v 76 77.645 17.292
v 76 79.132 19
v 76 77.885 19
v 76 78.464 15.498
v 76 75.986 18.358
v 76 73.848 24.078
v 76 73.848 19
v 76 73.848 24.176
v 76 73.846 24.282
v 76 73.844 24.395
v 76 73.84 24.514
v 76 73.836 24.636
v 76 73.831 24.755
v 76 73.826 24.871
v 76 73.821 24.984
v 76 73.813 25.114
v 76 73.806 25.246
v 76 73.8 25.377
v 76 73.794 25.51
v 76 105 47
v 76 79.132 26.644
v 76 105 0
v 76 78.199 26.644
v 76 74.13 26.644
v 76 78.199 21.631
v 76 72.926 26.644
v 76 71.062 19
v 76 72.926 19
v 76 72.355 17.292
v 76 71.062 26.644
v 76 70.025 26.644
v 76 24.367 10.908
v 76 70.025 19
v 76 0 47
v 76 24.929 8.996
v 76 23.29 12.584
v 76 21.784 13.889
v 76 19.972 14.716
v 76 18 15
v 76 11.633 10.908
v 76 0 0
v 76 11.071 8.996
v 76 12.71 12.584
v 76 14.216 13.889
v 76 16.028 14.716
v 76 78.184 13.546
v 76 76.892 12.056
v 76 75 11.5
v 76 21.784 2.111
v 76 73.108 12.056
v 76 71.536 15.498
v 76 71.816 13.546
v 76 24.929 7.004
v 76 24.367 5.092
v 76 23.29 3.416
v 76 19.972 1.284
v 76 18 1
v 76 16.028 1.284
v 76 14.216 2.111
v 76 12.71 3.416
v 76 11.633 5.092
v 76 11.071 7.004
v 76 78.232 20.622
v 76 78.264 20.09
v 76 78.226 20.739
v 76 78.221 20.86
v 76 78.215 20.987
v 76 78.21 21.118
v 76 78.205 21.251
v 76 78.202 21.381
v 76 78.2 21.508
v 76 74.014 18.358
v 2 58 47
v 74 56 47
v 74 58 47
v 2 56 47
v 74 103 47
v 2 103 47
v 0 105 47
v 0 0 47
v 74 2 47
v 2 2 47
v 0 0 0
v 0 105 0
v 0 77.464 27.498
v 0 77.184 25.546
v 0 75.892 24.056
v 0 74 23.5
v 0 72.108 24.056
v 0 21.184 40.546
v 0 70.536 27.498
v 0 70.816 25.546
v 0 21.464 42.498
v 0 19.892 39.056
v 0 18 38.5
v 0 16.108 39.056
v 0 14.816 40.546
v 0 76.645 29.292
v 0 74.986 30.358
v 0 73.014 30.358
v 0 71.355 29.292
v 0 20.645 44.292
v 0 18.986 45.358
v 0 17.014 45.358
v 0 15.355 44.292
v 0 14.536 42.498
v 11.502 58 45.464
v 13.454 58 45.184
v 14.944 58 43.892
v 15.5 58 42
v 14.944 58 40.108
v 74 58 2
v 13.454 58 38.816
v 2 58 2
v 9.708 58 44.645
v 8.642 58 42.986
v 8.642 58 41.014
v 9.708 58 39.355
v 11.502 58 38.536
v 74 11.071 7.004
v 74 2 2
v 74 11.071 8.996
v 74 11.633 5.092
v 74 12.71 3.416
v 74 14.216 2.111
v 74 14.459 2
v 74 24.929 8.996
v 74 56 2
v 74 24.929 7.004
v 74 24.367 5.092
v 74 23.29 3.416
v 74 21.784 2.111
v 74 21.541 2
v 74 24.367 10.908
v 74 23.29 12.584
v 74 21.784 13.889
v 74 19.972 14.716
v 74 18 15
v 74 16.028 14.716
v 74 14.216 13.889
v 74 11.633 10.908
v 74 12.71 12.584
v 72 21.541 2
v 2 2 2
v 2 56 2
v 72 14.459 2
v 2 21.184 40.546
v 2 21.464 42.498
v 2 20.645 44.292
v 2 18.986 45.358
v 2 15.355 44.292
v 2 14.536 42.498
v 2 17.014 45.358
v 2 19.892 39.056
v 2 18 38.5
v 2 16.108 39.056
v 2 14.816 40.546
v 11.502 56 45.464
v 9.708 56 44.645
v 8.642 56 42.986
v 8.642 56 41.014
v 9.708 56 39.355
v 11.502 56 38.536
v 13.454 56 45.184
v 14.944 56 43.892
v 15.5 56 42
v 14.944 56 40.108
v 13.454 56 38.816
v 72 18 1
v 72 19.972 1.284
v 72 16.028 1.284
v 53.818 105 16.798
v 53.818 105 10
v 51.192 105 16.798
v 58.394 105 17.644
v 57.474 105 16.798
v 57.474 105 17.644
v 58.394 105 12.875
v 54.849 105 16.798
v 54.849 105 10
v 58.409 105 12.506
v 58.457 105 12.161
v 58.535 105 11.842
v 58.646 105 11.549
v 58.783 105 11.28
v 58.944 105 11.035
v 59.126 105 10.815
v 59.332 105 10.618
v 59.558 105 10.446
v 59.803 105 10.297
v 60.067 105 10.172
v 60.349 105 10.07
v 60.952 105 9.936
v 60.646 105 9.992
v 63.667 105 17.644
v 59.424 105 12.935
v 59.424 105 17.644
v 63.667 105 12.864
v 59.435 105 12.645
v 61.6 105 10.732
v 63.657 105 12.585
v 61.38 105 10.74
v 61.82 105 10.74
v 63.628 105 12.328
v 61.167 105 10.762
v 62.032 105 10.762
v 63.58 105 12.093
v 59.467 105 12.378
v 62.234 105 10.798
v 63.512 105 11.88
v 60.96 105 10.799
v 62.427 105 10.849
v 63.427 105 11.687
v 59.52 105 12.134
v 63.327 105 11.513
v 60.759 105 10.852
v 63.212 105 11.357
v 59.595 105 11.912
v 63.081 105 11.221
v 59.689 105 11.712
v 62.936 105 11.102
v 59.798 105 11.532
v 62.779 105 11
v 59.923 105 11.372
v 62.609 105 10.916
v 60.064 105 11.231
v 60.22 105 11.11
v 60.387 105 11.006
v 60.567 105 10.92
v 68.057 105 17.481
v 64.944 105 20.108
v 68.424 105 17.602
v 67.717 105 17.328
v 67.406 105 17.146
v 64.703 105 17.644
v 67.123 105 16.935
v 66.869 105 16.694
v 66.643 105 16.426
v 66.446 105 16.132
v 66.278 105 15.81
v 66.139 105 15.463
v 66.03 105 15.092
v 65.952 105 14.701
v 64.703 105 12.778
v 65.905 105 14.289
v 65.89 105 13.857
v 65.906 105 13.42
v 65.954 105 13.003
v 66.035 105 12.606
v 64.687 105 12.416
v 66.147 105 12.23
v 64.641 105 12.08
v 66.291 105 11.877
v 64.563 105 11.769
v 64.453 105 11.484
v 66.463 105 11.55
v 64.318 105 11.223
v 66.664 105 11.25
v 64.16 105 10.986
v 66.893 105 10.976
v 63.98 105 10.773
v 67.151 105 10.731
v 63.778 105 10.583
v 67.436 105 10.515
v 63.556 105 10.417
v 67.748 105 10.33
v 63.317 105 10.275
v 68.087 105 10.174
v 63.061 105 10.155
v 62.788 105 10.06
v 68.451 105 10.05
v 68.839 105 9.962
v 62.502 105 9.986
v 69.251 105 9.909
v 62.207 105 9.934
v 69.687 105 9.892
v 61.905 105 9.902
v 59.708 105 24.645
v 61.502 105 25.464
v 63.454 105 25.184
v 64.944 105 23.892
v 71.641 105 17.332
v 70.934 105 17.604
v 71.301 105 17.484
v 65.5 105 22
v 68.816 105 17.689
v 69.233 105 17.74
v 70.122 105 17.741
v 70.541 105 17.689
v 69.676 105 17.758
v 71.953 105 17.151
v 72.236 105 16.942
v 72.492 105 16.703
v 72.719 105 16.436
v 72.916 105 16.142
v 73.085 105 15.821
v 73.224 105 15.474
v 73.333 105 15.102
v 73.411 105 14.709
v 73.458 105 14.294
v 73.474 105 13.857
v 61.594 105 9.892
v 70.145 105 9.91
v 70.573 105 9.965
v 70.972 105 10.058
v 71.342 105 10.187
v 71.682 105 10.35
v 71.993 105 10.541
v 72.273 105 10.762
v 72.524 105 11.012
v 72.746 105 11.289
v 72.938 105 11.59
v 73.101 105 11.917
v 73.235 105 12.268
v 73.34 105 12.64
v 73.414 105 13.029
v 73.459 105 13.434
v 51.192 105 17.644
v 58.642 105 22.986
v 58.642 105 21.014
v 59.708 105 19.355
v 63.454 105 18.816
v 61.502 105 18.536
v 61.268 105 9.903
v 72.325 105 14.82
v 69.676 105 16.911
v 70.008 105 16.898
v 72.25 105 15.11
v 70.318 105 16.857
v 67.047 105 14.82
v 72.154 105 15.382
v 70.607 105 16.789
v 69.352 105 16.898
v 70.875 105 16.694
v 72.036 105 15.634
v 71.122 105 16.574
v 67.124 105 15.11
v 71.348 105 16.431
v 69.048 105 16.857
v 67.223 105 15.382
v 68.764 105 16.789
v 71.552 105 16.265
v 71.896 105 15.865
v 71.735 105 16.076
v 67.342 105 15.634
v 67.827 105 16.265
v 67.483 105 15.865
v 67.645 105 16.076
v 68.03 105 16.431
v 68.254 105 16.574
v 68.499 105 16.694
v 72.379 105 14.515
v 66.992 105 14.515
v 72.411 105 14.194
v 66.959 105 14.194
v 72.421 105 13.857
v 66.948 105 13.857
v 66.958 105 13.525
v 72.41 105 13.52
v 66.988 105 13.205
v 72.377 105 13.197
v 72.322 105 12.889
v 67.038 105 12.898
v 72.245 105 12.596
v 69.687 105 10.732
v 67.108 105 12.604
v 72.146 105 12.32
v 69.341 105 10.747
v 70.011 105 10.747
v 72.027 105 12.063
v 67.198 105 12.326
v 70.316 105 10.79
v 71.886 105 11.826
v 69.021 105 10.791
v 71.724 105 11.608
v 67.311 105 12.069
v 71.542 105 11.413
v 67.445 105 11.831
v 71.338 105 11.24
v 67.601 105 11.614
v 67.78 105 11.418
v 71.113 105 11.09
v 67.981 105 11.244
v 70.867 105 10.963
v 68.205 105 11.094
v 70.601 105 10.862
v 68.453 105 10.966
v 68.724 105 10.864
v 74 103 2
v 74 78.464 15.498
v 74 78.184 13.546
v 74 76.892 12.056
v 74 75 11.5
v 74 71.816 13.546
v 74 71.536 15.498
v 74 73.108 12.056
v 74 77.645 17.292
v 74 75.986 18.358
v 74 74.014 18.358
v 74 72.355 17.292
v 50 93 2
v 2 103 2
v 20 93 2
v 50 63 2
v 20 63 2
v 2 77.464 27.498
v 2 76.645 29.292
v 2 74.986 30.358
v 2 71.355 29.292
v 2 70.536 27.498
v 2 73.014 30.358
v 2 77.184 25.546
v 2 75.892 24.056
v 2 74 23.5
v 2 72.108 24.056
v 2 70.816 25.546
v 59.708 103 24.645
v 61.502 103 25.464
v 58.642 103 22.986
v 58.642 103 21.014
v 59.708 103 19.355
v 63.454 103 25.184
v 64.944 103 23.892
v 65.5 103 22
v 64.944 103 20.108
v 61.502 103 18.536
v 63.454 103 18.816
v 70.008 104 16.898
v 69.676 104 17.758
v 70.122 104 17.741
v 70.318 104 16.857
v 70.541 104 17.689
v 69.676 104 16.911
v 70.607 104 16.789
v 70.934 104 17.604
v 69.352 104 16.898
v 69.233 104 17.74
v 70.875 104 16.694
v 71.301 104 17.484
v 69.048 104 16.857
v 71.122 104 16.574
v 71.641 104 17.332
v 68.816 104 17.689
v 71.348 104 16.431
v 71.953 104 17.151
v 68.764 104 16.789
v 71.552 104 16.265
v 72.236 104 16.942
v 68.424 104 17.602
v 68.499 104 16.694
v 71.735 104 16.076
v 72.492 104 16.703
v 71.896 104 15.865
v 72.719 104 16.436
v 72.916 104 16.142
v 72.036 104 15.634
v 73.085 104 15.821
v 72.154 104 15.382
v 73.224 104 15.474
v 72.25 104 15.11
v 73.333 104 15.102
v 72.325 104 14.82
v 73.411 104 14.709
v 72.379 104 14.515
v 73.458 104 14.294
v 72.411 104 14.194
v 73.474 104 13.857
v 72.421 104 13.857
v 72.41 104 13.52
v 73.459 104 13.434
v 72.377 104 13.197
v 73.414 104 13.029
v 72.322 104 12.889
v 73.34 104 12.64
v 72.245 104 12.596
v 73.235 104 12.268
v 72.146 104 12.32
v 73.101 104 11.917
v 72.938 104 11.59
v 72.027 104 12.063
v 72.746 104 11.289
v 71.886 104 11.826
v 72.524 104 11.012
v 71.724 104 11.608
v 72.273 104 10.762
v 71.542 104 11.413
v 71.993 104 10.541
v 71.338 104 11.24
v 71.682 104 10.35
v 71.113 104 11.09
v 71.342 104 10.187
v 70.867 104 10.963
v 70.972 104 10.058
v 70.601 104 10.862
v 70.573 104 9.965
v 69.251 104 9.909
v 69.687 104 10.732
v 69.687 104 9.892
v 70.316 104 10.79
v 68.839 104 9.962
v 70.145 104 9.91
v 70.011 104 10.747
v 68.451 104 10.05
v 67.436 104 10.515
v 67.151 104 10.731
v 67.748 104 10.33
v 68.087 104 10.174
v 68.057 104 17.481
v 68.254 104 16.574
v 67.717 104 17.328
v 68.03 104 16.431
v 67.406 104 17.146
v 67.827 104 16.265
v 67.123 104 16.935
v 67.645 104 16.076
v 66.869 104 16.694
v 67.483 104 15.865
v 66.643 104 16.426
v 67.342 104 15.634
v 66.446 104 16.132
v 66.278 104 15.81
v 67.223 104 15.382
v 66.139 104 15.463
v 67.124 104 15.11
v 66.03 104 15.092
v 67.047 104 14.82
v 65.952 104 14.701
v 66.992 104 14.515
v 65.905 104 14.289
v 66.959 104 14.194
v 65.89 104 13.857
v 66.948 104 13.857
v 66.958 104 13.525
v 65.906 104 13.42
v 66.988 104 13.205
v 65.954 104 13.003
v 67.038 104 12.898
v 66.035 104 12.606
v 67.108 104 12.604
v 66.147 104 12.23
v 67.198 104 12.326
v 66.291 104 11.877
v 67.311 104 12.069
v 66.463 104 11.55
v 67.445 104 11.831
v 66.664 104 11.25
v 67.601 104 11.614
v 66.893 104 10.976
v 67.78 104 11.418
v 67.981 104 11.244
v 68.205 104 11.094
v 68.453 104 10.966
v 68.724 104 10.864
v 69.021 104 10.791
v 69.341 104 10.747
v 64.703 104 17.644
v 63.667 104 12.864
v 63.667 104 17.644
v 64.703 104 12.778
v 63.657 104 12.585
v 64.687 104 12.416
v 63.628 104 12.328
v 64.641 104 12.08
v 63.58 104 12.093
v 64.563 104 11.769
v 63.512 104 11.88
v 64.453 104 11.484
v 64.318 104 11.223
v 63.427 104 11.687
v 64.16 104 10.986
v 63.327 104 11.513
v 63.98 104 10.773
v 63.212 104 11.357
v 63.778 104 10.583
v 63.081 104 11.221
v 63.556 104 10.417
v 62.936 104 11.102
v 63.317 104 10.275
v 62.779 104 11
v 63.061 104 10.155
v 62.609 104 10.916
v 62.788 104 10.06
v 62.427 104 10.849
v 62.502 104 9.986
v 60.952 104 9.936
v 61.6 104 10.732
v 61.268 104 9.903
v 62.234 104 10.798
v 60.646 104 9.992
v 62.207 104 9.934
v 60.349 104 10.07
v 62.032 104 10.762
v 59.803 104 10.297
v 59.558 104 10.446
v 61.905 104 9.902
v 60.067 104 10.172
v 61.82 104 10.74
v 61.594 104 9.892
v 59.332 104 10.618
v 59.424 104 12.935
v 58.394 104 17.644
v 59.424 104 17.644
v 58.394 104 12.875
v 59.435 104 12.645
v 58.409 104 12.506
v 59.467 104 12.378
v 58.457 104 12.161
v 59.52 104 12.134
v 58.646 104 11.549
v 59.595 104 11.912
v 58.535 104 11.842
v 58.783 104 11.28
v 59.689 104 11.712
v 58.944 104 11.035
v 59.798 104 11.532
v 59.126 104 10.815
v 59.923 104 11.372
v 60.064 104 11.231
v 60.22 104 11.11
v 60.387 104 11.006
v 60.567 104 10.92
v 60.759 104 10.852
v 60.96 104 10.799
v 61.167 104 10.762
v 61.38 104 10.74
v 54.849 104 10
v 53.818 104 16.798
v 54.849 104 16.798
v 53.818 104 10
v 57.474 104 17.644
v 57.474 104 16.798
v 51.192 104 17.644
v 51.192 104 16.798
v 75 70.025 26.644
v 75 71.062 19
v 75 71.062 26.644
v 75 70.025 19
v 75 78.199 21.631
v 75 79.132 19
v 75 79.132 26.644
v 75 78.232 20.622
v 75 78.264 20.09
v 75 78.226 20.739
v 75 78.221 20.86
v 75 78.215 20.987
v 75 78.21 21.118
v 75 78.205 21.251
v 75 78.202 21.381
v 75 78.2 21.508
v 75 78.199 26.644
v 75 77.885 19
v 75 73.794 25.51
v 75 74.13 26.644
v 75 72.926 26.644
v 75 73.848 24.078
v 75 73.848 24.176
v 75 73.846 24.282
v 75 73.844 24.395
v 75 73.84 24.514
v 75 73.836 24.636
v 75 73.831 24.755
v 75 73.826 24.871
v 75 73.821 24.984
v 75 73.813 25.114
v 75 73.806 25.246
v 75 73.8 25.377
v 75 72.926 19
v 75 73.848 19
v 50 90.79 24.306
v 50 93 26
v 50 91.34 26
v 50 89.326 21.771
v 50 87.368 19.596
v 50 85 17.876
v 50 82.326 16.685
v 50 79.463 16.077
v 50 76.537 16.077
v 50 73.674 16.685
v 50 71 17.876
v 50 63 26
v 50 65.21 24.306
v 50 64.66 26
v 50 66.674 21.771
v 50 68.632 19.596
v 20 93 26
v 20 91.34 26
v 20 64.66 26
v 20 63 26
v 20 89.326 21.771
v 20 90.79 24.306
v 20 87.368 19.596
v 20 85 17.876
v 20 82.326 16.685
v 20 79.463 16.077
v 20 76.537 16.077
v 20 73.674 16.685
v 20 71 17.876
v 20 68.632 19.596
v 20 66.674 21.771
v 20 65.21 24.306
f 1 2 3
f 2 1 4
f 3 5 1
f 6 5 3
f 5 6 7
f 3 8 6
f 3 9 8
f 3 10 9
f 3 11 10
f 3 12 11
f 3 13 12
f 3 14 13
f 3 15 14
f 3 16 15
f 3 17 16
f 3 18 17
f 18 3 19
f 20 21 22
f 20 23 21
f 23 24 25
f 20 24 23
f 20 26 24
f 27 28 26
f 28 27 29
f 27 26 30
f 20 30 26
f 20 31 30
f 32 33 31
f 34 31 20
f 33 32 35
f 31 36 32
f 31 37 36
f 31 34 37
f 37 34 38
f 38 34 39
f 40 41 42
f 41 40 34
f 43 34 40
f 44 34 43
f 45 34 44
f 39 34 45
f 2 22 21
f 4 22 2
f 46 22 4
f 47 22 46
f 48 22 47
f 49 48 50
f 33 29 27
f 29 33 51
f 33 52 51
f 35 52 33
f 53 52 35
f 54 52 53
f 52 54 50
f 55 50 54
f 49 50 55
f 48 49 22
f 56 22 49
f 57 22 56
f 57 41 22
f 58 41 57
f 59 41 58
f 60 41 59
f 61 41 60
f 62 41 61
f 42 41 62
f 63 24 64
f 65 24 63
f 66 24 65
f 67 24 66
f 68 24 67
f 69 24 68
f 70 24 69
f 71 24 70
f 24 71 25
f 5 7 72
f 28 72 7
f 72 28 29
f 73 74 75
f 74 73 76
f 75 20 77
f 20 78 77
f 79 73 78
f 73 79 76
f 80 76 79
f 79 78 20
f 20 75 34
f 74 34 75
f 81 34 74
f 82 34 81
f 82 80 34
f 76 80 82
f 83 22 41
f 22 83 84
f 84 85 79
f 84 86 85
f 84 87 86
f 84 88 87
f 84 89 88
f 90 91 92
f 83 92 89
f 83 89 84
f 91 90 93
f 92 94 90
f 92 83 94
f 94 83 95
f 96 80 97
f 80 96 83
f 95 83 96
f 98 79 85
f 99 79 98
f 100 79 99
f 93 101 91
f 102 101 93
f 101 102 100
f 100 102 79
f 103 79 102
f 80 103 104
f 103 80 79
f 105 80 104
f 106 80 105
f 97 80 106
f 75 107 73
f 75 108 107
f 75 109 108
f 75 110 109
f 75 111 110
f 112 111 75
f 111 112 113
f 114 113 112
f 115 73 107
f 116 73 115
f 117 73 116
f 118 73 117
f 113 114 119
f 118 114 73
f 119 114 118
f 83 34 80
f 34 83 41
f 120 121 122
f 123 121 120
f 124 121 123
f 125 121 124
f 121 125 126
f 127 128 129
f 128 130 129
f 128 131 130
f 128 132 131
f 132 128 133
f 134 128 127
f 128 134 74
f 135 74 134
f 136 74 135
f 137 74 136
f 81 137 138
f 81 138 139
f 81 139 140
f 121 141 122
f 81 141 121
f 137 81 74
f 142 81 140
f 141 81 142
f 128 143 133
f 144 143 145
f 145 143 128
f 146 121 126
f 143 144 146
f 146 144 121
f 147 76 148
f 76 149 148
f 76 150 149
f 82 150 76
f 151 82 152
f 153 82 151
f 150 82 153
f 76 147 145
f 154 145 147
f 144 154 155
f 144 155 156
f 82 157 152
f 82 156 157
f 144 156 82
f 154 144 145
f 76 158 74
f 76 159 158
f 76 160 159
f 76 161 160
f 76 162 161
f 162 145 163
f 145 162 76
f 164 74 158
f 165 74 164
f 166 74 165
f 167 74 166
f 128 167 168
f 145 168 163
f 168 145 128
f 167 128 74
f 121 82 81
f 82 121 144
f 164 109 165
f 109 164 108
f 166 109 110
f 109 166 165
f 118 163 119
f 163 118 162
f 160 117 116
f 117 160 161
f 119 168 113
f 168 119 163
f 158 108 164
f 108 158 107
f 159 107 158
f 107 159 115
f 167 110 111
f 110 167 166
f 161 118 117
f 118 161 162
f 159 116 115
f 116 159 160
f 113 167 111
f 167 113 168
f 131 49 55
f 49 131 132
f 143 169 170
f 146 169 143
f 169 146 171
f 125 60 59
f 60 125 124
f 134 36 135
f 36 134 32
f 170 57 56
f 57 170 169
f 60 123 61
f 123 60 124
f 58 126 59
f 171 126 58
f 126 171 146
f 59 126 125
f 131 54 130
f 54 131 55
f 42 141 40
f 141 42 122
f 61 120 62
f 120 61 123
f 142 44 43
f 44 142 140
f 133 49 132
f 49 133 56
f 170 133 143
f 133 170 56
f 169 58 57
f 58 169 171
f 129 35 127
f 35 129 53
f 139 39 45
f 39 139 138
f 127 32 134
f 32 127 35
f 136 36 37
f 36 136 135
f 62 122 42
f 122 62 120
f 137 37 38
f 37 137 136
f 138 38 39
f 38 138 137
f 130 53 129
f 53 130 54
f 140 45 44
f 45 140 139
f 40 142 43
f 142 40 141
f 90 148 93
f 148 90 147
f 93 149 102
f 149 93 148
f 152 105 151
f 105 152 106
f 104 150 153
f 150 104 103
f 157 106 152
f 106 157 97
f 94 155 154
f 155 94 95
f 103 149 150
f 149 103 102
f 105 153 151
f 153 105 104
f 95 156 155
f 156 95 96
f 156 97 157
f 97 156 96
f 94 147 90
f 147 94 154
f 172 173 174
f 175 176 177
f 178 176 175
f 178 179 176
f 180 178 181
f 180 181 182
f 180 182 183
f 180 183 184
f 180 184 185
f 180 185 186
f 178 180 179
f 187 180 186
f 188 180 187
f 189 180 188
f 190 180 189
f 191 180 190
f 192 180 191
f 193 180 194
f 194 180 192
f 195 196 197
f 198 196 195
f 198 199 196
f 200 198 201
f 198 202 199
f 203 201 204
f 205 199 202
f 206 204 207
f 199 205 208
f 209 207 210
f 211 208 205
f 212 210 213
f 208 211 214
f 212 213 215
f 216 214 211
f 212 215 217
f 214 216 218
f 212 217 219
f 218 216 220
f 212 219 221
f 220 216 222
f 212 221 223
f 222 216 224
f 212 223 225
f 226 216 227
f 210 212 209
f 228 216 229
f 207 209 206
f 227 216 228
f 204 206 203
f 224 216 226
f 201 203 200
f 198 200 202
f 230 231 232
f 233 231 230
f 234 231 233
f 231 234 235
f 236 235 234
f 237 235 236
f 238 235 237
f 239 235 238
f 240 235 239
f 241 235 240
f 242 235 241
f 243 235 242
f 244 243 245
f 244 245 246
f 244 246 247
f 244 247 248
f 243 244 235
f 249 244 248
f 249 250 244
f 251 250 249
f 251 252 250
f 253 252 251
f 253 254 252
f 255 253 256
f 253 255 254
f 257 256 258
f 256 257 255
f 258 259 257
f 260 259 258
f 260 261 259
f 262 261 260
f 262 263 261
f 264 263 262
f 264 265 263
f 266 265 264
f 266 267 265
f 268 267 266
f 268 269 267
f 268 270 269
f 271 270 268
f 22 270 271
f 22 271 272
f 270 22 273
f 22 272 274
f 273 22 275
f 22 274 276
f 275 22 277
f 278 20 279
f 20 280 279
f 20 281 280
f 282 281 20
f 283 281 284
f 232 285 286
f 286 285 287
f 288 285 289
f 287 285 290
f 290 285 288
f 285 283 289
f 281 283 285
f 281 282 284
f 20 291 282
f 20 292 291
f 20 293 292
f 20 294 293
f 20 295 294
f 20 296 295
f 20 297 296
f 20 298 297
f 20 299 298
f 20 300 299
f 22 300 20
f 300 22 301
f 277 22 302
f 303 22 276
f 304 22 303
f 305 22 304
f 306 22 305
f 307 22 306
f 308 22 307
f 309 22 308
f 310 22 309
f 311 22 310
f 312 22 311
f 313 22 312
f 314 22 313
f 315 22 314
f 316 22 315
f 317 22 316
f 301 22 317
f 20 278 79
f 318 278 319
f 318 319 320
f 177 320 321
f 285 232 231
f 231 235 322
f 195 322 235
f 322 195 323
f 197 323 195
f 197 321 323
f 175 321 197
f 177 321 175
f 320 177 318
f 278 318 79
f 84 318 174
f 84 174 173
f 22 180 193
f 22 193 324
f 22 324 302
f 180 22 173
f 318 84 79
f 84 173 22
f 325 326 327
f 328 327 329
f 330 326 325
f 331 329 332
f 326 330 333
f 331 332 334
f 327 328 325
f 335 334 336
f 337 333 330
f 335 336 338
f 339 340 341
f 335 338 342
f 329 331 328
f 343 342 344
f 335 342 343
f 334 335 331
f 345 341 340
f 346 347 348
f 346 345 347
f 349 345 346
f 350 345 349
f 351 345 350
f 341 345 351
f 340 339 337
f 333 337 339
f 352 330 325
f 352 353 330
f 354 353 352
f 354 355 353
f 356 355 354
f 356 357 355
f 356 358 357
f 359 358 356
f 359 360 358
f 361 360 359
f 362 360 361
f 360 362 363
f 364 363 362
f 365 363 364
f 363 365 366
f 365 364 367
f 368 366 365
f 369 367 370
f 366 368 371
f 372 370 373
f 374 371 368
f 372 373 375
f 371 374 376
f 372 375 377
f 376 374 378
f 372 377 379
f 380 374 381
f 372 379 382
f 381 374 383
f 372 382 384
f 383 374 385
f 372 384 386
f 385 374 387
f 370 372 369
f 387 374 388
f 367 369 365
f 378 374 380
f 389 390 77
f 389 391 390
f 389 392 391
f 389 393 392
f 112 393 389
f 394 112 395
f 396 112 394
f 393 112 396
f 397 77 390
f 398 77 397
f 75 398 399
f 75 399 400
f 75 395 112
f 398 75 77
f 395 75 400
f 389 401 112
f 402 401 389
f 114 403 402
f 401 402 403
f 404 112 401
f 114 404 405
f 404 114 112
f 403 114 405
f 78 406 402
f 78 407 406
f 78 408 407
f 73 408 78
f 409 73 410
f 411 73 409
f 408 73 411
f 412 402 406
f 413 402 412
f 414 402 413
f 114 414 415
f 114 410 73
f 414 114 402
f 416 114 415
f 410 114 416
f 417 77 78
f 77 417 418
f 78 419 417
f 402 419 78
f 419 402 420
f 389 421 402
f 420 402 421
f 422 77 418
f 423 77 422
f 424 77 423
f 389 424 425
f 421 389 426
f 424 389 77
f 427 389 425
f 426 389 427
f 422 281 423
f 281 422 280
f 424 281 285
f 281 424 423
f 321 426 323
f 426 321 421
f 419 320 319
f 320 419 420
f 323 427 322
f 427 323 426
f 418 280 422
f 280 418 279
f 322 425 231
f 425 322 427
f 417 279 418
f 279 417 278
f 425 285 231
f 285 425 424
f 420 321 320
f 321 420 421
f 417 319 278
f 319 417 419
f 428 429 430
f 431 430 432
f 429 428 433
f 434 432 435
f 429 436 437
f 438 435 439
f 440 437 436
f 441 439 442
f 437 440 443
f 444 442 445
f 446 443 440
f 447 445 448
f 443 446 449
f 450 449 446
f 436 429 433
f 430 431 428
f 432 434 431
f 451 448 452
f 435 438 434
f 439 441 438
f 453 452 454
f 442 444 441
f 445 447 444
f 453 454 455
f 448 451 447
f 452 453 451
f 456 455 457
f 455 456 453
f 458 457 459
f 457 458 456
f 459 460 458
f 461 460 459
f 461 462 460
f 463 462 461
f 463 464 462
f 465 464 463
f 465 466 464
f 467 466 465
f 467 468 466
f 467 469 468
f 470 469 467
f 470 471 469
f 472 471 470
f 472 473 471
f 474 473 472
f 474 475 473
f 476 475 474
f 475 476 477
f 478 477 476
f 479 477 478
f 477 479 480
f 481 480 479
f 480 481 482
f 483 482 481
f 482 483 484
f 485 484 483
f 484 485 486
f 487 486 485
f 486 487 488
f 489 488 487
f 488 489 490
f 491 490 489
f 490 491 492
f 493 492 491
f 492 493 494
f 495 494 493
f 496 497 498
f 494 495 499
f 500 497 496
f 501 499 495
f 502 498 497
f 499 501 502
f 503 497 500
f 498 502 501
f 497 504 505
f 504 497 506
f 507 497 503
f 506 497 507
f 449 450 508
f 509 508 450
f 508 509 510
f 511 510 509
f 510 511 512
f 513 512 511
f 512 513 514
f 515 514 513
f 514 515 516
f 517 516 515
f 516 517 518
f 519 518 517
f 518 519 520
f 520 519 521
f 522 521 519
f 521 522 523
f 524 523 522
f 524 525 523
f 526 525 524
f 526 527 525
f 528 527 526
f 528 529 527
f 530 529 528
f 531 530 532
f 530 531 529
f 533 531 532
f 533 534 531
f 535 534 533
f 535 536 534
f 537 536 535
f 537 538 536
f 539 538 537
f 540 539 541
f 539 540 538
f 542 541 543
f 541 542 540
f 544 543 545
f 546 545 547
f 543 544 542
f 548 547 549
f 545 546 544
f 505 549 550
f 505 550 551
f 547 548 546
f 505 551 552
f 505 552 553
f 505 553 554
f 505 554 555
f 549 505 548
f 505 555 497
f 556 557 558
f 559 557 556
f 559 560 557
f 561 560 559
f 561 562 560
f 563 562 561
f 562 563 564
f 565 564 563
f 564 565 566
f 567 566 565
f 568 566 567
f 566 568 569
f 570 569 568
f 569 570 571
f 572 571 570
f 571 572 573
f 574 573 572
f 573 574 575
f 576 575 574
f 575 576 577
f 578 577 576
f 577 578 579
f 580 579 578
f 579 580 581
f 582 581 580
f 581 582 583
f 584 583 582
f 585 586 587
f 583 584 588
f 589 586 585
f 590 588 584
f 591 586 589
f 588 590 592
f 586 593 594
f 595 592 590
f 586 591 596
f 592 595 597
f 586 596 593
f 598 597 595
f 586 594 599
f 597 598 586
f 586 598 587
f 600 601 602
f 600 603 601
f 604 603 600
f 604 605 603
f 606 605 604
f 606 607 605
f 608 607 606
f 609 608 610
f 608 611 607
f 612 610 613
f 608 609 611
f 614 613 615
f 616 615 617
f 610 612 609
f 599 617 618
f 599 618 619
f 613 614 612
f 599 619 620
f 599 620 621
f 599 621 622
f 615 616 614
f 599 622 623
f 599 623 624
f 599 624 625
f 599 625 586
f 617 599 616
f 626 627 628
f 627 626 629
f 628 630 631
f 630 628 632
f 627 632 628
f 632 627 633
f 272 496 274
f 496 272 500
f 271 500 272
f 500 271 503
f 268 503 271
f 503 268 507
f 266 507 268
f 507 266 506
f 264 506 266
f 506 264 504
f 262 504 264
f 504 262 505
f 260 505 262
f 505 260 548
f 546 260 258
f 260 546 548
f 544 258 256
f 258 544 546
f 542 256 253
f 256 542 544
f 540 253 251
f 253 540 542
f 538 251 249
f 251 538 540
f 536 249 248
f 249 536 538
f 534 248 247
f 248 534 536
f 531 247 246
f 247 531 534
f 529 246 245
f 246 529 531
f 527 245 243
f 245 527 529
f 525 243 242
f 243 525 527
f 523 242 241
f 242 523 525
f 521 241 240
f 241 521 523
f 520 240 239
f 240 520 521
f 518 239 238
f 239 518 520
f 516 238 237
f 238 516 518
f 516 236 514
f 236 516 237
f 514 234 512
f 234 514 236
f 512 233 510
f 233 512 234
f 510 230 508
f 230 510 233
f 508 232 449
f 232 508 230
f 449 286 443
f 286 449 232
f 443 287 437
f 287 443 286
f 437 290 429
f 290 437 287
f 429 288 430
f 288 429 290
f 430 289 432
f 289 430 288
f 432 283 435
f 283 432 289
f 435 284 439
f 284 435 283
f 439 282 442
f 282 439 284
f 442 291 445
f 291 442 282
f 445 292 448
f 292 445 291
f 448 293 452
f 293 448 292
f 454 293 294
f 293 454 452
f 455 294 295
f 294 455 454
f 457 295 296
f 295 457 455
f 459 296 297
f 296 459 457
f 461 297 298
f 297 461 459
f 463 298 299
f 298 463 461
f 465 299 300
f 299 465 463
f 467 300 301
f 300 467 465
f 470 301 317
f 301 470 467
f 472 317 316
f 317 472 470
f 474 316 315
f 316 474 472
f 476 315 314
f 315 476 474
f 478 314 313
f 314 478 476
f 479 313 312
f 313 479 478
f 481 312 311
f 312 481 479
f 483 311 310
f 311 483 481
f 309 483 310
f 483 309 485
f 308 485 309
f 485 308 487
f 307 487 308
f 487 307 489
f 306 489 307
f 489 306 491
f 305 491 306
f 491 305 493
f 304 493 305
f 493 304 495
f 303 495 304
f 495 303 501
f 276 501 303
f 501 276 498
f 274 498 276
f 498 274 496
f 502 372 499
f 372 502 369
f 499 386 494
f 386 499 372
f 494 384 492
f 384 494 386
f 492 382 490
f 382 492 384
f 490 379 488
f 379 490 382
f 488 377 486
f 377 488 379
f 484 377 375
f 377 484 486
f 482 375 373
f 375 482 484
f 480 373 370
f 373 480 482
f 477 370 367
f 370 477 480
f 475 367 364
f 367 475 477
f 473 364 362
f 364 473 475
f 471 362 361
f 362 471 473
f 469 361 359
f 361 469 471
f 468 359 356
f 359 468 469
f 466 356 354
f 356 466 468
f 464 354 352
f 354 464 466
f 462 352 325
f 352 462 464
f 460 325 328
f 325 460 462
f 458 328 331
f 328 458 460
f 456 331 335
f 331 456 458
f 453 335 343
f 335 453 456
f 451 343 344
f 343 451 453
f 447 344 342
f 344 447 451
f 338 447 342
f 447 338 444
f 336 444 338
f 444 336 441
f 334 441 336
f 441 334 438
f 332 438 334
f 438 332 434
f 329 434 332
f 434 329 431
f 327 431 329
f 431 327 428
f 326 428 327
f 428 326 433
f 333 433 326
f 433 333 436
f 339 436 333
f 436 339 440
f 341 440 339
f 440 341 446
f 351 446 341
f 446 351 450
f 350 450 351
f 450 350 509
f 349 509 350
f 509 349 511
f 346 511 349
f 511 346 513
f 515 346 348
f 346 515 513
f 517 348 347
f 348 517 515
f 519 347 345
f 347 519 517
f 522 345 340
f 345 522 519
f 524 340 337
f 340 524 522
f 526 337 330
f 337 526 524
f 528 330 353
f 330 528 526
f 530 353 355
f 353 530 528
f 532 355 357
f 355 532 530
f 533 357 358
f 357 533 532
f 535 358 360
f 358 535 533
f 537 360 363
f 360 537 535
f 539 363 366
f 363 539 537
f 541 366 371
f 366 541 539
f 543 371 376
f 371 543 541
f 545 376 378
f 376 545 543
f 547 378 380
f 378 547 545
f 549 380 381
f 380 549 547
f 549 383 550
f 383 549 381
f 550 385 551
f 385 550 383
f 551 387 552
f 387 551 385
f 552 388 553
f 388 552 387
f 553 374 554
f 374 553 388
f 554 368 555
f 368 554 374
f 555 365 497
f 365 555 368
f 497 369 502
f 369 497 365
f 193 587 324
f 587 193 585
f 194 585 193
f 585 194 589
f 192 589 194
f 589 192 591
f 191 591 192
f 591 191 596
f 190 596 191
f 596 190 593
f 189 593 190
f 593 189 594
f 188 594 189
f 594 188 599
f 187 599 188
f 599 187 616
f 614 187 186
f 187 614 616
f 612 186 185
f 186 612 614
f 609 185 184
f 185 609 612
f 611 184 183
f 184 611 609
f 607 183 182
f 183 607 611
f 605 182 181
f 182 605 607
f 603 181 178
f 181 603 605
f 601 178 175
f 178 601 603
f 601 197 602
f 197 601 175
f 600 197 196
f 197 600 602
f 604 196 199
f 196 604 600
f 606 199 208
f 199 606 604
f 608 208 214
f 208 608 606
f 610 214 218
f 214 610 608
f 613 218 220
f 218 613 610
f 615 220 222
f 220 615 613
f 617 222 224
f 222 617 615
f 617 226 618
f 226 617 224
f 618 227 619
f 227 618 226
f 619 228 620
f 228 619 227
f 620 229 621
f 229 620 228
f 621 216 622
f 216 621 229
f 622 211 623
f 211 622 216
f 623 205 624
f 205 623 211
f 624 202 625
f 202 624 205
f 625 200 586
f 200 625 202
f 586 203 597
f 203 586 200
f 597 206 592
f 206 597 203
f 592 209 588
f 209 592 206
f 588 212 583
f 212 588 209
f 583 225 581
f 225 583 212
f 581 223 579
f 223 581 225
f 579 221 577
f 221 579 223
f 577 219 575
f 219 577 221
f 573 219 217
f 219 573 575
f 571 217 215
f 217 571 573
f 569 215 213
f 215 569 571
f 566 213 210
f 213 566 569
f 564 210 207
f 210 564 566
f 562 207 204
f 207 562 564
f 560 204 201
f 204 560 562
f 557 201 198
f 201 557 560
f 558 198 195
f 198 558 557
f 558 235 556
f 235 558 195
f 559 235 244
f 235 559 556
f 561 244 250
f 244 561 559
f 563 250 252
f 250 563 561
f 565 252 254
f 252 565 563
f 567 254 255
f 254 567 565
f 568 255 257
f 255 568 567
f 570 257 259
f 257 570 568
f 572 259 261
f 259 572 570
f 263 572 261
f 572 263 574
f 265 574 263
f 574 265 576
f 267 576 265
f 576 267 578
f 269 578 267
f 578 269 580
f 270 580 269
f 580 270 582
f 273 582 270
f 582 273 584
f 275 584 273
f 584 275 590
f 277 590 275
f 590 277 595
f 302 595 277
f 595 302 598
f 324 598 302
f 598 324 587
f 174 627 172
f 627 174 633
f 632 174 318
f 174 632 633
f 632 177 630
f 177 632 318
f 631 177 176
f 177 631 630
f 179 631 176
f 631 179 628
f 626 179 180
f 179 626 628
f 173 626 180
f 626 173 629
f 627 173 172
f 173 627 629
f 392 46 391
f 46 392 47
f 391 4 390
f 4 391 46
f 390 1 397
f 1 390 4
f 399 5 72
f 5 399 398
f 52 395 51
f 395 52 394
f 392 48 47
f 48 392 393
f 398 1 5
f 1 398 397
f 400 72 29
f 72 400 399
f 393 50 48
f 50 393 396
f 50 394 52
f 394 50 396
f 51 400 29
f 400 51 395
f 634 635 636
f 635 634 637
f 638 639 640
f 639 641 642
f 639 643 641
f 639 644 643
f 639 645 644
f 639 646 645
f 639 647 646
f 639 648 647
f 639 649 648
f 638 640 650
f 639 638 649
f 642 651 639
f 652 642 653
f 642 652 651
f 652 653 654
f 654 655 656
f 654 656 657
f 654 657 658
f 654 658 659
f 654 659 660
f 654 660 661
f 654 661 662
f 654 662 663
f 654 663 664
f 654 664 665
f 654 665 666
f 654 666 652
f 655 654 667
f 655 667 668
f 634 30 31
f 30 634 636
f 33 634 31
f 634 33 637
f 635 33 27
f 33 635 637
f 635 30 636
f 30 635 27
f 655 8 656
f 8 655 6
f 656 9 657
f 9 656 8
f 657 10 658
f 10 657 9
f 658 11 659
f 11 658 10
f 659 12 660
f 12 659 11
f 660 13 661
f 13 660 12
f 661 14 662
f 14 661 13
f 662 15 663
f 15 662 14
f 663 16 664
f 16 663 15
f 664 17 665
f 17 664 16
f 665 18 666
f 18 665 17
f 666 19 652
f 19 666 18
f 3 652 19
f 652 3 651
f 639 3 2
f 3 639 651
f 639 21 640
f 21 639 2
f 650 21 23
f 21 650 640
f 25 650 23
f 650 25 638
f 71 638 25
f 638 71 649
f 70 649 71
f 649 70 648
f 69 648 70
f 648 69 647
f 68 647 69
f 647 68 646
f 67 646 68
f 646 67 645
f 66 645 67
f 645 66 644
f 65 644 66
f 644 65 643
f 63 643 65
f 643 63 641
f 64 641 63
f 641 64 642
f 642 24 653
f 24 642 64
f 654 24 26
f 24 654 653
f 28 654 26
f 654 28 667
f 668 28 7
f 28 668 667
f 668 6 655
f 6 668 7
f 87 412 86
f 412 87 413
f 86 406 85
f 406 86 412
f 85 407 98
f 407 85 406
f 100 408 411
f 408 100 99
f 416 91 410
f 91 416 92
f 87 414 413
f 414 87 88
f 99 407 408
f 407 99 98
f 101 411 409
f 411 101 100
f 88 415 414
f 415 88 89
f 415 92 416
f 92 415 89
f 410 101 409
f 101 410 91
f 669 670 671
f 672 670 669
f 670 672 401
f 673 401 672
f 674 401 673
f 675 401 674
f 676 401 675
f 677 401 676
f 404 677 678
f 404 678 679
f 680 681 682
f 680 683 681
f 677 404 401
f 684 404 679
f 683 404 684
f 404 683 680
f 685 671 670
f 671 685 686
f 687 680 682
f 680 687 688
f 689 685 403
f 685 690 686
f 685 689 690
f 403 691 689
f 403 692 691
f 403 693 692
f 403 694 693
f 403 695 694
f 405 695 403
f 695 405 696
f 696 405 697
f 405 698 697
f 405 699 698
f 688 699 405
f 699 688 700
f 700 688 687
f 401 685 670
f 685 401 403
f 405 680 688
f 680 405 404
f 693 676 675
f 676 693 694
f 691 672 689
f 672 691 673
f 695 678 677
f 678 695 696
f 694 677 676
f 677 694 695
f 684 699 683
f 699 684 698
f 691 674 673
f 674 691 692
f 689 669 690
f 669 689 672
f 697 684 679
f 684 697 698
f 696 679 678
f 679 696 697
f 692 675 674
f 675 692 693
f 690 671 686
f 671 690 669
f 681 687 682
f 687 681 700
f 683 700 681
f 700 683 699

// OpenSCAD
box_height=45;

arduino_length=72;
arduino_width=54;
arduino_height=24;
arduino_power_plug_width=16;
arduino_power_plug_height=6;
arduino_power_plug_radius=7;

motor_width=45;
motor_power_plug_width=16;
motor_power_plug_height=25;
tube_diameter=7;

out_height=20;
out_length=14;

in_height=13;
in_width=30;

cable_path_length=10;
cable_path_height=40;

// Which side the sensor
sensor_width=16;
sensor_height=40;

thickness=2;

motor_bed_position_length=20;
motor_bed_position_width=5;
motor_bed_length=30;
motor_bed_width=30;
motor_bed_height=24;
motor_bed_height_lower=30;
motor_diameter=28;

difference() {
	cube([arduino_length + 2 * thickness, arduino_width + 2 * thickness, box_height + thickness]);
	translate ([thickness, thickness, thickness]) cube([arduino_length, arduino_width, box_height]);
        translate([cable_path_length + thickness, arduino_width + 2 * thickness + 1, cable_path_height + thickness]) rotate([90, 0, 0]) cylinder(2 * thickness, r=tube_diameter/2);
	translate([arduino_length, arduino_power_plug_width + 1 * thickness, arduino_power_plug_height + thickness]) rotate([0, 90, 0]) cylinder(2 * thickness, r=arduino_power_plug_radius);
        translate([-1, sensor_width + 1 * thickness, sensor_height + thickness]) rotate([0, 90, 0]) cylinder(2 * thickness, r=tube_diameter/2);
}

translate([0, arduino_width + 2 * thickness, 0]) {
    // motor frame
    difference() {
	cube([arduino_length + 2 * thickness, motor_width + 1 * thickness, box_height + thickness]);
	translate ([thickness, 0, thickness]) cube([arduino_length, motor_width, box_height]);
	translate([arduino_length + 2 * thickness - out_length, motor_width + 1 * thickness,out_height + thickness]) rotate([90, 0, 0]) cylinder(2 * thickness, r=tube_diameter/2);
        translate([arduino_length + 2 * thickness - out_length + 12, motor_width + thickness/2, out_height + thickness - 12]) rotate([-90, 180, 0]) linear_extrude(thickness / 2) text("OUT", size=8);
        translate([arduino_length + 1, motor_width + 1 * thickness - in_width, in_height + thickness]) rotate([0, 90, 0]) cylinder(2 * thickness, r=tube_diameter/2);
        translate([arduino_length + 1.5 * thickness, motor_width - in_width - 4, in_height + thickness + 4]) rotate([90, 0, 90]) linear_extrude(thickness / 2) text("IN", size=8); 
        translate([-1, motor_power_plug_width, motor_power_plug_height + thickness]) rotate([0, 90, 0]) cylinder(2 * thickness, r=tube_diameter/2); 
    }
        
    //motorbed
    difference() {
        translate([motor_bed_position_length, motor_bed_position_width, thickness]) cube([motor_bed_length, motor_bed_width, motor_bed_height]);
        translate([motor_bed_position_length - motor_bed_width, motor_bed_position_width + motor_diameter/2 + (motor_bed_width - motor_diameter) / 2, motor_bed_height_lower]) rotate([90, 0, 90]) cylinder(motor_bed_width * 2, r=motor_diameter/2);    
    }
    
}
